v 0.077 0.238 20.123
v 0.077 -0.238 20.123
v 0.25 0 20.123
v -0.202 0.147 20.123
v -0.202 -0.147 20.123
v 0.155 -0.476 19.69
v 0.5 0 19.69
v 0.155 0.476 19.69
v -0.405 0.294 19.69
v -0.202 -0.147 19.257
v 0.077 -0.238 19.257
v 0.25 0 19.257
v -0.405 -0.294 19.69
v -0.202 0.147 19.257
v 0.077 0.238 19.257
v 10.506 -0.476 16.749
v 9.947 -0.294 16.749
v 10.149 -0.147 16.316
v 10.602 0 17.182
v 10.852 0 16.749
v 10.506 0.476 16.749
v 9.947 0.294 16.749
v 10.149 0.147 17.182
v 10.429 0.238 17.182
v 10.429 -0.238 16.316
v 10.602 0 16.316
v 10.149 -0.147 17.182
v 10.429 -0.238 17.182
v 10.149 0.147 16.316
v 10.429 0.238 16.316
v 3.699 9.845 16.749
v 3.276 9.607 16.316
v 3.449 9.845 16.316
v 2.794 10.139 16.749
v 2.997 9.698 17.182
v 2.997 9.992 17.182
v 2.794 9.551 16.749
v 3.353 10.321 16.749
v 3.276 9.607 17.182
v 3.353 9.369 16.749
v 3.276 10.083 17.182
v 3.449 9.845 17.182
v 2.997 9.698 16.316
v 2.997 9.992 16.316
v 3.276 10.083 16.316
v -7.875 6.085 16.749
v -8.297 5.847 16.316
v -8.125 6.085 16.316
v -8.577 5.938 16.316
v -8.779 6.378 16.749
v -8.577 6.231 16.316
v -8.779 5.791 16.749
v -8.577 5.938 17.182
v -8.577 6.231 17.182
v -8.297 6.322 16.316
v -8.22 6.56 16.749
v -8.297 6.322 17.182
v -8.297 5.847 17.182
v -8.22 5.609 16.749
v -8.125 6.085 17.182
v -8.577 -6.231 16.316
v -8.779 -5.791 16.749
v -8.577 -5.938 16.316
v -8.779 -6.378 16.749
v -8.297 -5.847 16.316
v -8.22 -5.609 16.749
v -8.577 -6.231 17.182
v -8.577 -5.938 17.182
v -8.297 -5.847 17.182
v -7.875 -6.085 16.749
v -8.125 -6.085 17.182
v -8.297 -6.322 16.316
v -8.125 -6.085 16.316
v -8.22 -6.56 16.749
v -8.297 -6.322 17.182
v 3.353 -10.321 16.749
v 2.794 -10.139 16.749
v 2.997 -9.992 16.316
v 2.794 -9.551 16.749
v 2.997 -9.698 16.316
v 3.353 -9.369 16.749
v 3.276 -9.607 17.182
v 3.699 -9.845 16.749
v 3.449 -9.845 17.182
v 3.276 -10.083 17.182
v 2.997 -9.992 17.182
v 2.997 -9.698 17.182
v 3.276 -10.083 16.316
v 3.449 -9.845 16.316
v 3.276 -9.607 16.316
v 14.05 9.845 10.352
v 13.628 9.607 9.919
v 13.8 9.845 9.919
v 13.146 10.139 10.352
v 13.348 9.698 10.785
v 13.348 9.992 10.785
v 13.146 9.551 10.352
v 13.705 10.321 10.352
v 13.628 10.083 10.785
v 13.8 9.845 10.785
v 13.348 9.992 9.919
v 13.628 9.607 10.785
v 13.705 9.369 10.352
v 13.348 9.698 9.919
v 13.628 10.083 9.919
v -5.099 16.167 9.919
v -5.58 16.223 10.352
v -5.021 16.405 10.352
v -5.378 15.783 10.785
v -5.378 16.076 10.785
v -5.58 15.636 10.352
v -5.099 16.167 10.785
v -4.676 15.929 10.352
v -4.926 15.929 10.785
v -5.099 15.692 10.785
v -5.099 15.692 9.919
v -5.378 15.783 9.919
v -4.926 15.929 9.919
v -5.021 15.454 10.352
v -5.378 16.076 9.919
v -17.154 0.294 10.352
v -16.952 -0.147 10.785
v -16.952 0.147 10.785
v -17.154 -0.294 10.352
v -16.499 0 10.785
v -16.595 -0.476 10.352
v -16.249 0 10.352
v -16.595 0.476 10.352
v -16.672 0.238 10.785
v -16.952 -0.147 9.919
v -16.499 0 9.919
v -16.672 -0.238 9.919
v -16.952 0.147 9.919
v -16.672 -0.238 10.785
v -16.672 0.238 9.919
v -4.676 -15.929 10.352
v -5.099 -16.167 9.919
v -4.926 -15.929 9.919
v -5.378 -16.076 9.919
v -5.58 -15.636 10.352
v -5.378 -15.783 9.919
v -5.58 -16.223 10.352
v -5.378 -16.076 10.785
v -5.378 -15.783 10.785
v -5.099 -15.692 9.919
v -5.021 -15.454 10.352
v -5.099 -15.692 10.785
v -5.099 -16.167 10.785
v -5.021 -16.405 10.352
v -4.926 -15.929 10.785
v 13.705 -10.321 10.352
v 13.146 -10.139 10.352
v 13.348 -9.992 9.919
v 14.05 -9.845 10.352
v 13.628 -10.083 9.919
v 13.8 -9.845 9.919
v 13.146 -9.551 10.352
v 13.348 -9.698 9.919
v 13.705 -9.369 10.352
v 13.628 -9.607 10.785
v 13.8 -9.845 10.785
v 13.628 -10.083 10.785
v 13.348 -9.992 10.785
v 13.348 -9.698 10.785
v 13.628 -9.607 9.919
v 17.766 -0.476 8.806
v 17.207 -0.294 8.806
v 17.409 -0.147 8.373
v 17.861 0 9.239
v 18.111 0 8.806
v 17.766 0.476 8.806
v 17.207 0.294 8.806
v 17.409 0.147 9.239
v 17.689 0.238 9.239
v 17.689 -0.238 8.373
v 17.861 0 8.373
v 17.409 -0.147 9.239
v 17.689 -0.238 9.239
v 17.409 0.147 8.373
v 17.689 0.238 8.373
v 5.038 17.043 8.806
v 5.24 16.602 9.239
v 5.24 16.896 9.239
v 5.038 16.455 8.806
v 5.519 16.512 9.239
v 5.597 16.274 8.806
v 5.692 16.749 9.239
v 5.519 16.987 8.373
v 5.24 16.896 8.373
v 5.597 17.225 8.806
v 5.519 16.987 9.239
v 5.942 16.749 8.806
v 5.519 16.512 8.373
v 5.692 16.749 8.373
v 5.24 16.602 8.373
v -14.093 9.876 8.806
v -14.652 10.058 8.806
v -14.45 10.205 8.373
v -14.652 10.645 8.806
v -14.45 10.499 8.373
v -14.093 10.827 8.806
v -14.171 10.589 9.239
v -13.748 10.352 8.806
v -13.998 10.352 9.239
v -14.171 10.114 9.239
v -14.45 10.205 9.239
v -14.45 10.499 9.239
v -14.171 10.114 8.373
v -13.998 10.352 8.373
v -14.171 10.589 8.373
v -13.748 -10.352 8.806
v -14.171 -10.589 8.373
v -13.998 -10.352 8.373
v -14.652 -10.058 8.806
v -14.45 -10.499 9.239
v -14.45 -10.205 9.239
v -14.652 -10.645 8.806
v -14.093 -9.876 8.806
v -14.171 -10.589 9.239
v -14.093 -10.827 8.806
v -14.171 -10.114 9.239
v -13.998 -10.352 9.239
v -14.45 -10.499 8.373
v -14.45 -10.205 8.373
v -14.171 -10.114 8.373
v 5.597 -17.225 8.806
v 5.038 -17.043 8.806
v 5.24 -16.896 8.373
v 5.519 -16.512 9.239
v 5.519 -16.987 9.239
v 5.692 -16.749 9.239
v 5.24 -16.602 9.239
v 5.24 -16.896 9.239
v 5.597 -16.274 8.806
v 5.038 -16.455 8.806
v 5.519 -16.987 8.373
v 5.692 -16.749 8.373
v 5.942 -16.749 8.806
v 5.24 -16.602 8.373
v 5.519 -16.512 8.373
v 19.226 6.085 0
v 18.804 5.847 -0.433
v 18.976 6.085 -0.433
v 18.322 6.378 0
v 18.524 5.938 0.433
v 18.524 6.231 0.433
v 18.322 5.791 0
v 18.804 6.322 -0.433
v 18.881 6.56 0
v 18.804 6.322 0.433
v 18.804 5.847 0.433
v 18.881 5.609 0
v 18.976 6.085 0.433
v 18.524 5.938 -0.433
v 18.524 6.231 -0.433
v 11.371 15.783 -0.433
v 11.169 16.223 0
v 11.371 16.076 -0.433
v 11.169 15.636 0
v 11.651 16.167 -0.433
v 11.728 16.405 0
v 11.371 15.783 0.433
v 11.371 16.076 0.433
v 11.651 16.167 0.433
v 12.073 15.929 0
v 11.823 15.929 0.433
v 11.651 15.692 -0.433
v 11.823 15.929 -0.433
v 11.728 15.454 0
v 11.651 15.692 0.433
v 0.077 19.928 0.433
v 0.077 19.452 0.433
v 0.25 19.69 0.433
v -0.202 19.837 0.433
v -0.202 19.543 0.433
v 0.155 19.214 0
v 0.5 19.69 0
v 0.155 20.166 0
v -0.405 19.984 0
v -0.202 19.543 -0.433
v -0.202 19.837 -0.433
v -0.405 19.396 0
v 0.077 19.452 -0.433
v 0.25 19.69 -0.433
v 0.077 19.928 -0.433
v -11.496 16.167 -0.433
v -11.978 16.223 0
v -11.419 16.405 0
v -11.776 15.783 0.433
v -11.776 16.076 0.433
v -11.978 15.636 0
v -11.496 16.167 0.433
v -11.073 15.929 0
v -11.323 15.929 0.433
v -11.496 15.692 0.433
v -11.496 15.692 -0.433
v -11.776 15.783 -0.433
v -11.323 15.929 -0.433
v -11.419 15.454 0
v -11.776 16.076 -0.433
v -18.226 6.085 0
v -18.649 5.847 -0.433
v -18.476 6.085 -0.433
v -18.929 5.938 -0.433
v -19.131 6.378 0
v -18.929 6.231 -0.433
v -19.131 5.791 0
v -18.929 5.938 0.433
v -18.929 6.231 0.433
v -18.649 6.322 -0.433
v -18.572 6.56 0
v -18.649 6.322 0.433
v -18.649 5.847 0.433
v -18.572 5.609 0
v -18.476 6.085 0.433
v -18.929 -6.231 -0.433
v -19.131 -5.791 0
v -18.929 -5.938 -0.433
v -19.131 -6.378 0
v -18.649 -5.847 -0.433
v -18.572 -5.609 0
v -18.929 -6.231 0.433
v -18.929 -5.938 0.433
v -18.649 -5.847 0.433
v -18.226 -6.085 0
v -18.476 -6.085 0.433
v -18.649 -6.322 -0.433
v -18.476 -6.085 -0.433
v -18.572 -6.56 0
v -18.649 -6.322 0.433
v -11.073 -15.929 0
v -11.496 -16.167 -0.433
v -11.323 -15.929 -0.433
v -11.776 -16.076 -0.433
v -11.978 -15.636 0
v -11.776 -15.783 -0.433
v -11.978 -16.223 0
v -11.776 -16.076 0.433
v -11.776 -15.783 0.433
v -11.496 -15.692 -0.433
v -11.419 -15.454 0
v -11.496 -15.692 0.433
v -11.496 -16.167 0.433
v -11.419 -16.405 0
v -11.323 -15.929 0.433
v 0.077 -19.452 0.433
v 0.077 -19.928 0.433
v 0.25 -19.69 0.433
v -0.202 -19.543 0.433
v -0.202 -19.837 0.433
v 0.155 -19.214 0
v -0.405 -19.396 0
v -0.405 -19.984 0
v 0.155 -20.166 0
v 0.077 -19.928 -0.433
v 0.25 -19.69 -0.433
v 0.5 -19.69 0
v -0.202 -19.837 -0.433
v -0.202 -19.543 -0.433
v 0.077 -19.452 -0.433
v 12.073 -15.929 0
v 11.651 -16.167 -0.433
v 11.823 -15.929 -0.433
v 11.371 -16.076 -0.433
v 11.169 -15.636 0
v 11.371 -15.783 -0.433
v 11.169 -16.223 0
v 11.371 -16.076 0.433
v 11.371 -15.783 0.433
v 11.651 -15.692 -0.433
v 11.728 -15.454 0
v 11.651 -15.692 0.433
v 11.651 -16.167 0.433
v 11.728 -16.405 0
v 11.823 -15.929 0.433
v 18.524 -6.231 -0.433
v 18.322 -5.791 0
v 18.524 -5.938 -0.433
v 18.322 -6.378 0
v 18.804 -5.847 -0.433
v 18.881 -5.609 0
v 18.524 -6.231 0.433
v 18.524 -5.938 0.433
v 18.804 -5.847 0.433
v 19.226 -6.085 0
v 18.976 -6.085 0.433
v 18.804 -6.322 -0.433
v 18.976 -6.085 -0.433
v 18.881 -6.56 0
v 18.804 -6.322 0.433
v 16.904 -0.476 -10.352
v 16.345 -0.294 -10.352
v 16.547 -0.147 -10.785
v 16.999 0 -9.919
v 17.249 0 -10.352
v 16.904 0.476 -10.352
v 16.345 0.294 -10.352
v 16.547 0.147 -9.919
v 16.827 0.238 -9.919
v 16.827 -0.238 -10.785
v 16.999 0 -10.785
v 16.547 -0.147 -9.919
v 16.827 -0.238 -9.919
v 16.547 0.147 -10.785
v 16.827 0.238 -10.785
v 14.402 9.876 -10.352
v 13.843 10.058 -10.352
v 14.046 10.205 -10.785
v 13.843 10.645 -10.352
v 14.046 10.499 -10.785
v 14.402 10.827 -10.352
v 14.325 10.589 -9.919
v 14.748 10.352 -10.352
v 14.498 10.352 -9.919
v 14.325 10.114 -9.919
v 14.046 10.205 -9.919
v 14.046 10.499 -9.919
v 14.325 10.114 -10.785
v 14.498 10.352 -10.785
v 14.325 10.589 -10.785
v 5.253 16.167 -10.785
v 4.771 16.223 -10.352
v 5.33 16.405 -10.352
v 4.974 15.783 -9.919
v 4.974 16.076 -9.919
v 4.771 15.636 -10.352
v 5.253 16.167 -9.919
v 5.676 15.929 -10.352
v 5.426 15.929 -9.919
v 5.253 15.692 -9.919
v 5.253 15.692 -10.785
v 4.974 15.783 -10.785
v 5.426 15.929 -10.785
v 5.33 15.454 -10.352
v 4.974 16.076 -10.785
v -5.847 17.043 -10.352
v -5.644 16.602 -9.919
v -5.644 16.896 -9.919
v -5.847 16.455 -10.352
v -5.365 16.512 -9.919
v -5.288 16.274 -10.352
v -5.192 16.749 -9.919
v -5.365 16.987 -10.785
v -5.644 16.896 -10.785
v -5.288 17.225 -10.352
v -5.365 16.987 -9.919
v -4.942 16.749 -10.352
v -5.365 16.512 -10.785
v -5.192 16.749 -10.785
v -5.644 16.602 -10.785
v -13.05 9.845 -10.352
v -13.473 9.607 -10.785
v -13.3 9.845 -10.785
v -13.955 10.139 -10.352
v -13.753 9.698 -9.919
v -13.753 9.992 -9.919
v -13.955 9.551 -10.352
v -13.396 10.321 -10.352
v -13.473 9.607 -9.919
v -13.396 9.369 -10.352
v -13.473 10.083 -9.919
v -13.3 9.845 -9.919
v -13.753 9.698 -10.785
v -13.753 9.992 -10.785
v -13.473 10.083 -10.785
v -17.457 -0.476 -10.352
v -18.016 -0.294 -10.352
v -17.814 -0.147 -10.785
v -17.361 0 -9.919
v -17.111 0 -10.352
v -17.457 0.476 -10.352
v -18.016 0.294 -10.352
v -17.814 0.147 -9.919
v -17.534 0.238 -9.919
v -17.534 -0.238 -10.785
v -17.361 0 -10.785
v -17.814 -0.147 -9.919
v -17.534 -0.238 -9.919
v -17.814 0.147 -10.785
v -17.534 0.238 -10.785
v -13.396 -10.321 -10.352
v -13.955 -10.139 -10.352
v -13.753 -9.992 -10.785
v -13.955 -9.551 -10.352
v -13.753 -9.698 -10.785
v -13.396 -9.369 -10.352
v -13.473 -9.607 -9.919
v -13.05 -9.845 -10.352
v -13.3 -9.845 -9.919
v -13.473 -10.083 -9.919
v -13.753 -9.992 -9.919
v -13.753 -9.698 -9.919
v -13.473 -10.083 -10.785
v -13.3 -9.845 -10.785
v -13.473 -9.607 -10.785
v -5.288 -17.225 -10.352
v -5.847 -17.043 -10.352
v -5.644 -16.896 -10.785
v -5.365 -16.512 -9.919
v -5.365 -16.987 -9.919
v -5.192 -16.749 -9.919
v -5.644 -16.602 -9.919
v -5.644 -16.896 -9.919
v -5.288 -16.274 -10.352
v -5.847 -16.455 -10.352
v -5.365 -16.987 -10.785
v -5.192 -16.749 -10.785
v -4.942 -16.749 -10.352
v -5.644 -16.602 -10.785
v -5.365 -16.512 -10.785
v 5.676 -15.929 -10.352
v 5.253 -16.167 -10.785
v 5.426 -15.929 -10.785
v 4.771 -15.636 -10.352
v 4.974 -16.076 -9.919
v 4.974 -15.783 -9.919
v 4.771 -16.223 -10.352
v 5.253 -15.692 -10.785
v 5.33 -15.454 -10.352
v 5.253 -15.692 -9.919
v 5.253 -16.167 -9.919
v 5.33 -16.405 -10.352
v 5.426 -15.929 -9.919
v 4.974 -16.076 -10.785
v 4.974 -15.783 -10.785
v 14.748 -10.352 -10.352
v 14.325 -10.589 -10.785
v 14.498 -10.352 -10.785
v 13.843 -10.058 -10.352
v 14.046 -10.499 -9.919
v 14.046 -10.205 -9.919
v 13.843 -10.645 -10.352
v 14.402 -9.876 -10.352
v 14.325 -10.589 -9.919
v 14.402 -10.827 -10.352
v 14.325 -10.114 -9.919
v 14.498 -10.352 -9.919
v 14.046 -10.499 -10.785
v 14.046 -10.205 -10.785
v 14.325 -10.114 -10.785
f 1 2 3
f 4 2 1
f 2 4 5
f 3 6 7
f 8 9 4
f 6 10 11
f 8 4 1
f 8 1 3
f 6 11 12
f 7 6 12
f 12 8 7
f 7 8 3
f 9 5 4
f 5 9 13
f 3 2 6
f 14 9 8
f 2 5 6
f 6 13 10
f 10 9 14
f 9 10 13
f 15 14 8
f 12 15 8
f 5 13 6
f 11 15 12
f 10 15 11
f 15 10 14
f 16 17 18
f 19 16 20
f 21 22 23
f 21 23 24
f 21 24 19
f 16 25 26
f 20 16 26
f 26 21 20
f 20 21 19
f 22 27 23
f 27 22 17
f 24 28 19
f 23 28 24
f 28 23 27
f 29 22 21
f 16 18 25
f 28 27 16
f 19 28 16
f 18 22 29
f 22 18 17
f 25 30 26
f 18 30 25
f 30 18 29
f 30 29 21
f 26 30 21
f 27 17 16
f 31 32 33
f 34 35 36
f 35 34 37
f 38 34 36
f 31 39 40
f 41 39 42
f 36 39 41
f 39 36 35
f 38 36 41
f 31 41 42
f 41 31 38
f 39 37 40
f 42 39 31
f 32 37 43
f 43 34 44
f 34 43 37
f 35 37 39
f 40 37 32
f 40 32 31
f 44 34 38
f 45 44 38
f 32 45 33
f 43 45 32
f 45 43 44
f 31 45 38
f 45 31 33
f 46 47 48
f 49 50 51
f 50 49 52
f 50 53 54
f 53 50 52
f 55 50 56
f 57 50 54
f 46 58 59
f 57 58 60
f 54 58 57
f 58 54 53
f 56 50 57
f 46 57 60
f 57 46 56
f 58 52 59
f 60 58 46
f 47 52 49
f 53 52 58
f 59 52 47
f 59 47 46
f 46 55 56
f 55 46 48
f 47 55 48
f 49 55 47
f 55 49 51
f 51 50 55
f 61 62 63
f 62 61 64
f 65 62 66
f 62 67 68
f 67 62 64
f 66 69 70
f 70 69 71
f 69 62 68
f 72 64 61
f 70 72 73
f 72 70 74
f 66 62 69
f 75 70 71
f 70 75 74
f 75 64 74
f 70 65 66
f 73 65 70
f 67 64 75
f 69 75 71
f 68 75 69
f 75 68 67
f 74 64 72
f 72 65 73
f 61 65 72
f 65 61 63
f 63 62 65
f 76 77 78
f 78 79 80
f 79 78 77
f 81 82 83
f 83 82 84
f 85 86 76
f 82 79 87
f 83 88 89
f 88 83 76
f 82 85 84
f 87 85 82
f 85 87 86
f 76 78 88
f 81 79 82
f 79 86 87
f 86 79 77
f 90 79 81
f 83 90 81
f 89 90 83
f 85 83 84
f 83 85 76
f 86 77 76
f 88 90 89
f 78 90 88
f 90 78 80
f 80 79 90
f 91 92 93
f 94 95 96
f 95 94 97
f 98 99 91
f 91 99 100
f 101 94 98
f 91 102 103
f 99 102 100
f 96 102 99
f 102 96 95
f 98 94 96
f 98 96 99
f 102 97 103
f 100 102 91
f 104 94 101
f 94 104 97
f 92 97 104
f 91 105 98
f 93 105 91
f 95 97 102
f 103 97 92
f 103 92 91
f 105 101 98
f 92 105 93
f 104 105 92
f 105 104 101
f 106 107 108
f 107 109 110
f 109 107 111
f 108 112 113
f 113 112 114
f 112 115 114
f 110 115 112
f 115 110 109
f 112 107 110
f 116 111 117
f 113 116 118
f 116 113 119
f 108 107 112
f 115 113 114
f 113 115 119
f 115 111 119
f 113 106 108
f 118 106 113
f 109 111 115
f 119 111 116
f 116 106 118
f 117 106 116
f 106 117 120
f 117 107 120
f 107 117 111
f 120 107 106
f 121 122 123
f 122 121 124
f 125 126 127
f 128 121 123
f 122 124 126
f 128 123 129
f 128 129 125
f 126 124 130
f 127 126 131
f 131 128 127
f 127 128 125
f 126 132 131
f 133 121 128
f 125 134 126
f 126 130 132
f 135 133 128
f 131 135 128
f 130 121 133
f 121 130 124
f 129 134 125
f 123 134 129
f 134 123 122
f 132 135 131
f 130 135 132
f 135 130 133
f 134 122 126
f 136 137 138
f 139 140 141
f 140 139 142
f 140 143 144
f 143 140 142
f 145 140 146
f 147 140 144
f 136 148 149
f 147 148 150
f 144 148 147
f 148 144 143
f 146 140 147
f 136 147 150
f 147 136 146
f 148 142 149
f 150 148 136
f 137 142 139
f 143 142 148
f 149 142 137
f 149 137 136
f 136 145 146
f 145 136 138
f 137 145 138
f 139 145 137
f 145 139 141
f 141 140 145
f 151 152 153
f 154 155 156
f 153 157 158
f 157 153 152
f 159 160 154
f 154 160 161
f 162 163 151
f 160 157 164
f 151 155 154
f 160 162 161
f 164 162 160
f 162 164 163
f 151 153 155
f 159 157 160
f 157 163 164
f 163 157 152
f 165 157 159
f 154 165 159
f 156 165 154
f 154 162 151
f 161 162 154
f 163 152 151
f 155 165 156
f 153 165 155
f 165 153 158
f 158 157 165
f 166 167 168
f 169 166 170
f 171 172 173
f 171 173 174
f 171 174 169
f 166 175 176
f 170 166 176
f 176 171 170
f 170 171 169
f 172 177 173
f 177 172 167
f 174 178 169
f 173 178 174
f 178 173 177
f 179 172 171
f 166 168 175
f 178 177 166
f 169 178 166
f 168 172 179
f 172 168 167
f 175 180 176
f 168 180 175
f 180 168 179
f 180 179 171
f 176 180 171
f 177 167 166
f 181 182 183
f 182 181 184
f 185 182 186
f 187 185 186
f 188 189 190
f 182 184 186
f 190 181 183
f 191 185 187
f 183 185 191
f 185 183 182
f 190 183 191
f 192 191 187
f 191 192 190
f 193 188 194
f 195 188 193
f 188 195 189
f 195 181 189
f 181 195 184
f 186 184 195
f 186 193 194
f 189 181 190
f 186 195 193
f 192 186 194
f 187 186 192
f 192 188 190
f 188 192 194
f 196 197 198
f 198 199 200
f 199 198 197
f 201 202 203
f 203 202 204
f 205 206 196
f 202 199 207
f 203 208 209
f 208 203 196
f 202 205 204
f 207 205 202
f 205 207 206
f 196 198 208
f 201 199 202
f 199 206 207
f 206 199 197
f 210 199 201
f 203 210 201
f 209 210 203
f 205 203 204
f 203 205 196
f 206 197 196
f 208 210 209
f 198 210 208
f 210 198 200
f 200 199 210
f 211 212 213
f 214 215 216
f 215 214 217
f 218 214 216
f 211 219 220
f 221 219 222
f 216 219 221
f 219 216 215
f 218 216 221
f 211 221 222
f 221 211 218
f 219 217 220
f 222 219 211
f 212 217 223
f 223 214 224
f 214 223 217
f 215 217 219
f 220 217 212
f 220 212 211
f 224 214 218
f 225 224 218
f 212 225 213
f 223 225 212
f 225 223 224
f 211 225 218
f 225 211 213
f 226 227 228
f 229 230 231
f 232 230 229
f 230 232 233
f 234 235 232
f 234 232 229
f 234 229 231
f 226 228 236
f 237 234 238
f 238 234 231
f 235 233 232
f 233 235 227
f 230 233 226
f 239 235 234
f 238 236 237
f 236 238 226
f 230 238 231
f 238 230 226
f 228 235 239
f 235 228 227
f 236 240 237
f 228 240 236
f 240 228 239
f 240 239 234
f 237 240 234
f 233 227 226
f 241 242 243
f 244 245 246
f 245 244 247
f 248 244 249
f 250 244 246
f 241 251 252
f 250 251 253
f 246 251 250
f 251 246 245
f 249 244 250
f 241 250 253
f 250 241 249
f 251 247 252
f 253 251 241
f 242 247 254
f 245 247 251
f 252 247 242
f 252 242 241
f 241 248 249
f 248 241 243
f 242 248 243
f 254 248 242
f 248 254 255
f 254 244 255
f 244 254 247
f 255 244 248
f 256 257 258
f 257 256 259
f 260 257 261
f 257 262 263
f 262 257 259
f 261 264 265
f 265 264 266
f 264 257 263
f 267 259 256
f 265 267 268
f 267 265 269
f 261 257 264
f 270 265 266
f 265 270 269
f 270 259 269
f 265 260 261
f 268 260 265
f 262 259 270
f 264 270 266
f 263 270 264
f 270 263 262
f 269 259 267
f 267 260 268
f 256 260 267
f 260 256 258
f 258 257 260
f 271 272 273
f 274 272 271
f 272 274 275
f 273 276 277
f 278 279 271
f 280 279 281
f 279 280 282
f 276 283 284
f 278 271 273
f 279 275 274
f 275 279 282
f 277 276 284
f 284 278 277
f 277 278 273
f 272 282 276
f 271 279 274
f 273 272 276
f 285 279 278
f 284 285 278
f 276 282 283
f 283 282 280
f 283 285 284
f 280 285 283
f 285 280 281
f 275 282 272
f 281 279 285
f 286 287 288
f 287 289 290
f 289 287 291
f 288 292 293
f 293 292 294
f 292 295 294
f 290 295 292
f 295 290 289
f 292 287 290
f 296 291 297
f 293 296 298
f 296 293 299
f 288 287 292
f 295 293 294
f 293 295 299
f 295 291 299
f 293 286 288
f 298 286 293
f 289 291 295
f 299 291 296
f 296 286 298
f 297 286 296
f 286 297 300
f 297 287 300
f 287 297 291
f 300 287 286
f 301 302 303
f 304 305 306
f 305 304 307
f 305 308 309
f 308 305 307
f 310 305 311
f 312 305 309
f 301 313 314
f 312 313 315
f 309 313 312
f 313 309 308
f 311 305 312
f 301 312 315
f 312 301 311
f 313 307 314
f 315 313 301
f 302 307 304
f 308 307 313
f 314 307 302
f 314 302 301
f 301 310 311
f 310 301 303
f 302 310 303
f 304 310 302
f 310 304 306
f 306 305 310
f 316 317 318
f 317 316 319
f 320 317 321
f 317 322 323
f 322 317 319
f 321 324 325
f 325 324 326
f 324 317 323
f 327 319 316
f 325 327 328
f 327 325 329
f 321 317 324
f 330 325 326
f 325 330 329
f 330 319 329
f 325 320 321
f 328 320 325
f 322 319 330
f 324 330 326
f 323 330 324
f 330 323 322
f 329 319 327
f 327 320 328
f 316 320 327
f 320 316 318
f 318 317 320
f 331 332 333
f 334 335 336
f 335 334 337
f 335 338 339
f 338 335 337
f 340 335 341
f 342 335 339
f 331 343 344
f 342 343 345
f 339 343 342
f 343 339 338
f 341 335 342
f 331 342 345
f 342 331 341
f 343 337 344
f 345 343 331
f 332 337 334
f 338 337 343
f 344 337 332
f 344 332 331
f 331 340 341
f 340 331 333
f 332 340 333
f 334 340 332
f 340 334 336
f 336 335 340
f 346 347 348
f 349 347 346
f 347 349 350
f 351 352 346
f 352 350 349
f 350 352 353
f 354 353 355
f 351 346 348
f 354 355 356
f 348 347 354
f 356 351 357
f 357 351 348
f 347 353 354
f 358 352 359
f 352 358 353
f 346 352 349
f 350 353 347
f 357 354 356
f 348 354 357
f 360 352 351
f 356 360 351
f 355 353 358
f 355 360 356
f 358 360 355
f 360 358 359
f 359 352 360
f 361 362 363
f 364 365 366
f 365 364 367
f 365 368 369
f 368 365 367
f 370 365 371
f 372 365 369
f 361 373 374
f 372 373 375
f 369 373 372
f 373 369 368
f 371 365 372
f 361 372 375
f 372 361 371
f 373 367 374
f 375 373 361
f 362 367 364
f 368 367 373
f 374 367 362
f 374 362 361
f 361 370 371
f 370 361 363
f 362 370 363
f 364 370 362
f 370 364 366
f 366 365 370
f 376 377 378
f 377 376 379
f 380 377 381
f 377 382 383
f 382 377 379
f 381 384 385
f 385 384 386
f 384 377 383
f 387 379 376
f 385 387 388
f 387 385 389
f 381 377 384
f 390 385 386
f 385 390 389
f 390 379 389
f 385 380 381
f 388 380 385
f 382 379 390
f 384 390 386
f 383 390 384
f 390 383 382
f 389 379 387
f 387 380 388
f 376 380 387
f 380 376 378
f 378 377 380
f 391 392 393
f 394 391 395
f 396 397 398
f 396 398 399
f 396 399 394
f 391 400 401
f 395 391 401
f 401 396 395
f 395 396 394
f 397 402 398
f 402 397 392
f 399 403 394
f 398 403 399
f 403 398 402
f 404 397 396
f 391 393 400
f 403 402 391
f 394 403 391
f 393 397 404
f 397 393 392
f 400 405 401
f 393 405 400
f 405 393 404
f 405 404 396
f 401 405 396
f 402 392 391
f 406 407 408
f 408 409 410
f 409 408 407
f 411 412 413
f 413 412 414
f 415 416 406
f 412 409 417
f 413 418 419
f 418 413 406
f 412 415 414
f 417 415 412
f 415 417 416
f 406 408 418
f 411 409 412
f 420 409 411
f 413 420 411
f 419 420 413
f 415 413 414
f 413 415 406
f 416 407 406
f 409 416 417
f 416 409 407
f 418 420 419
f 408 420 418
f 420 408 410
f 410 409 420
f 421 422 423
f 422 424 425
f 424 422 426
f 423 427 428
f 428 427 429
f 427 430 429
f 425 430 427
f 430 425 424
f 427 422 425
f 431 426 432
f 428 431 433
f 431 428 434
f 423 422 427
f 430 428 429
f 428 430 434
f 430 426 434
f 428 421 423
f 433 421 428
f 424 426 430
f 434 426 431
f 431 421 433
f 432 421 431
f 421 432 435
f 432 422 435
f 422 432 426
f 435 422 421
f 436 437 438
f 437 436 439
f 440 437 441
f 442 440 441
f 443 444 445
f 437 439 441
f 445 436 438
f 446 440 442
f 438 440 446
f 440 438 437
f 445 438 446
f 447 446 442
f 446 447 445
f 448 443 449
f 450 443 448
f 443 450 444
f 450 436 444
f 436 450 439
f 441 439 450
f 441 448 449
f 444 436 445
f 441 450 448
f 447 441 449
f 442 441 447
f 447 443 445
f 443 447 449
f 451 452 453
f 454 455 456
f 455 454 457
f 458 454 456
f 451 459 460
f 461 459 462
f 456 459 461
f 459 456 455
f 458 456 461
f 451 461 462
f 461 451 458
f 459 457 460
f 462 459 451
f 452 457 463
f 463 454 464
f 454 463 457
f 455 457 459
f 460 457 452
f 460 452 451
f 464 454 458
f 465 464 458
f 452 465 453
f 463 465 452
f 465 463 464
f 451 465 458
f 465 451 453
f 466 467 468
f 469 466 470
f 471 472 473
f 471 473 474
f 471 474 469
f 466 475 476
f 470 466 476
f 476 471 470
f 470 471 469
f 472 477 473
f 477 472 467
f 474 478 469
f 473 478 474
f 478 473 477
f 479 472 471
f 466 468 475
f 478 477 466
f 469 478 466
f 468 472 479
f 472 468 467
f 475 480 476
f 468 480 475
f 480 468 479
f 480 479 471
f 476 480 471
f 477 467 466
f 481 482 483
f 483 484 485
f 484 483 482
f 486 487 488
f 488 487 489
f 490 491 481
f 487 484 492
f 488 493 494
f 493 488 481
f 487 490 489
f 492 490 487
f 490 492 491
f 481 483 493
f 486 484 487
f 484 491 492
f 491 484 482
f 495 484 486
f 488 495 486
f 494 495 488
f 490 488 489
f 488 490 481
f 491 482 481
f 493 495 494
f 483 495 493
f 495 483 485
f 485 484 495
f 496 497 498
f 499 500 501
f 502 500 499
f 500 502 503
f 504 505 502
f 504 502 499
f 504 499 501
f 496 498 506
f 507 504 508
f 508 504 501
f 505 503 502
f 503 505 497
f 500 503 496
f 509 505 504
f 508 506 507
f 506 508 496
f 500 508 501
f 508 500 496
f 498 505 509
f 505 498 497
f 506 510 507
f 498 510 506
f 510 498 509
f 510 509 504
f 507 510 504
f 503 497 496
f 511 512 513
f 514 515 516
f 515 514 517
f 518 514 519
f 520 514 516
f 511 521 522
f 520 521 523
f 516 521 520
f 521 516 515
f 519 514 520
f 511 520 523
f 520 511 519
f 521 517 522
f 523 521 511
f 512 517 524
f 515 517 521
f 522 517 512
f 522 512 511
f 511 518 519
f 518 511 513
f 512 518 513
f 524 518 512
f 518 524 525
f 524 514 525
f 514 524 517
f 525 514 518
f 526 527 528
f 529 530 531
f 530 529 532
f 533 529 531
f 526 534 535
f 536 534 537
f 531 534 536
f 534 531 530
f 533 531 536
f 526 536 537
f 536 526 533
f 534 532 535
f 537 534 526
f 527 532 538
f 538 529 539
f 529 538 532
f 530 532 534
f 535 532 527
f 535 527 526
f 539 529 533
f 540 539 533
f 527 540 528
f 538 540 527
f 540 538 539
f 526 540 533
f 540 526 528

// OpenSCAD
// R50cm geodesic dome 
// 04/19/2016
// 04/21/2016

default_radius = 0.5;

// vertex(default_radius, 0, 0, 19.69); 

V = 
[
    // 1st row  
    [0, 0, 19.69],                  // 0
    
    // 2nd row
    // [10.3516, 0, -10.3517],      // 2 bug 
    [10.3516, 0, 16.7493],          // 2 correct     
    [3.19883,9.845,16.7493],        // 12 
    [-8.37466,6.08454,16.7493],     // 9        
    [-8.37466,-6.08454,16.7493],    // 6
    [3.19883,-9.845,16.7493],       // 1
 
        
    // 3rd row        
    [ 13.5505,9.845,10.3517 ],      // 15
    [ -5.17583,15.9295,10.3517 ],   // 14
    [-16.7493,0,10.3517],           // 11
    [-5.17583,-15.9295,10.3517],    // 8
    [13.5505,-9.845,10.3517],       // 4

    
    // 4th row    
    [17.6113, 0, 8.80564],          // 5
    [ 5.44218,16.7493,8.80564 ],    // 13
    [-14.2478,10.3516,8.80564],     // 10
    [-14.2478,-10.3516,8.80564],    // 7   
    [5.44218,-16.7493,8.80564],     // 3

    
    // 5th row
    [ 18.7263,6.08454,0],           // 34
    [ 11.5735,15.9295,0],           // 31
    [  0,19.69,0 ],                 // 30
    [ -11.5735,15.9295,0 ],         // 27
    [ -18.7263,6.08454,0 ],         // 26
    [ -18.7263,-6.08454,0 ],        // 23    
    [ -11.5735,-15.9295,0 ],        // 22
    [ 0,-19.69,0 ],                 // 19
    [ 11.5735,-15.9295,0 ],         // 17    
    [ 18.7263,-6.08454,0 ],         // 16   
    
    
    // 6th row      
    [ 16.7493, 0, -10.3517],          // 35
    [ 14.2478, 10.3516, -10.3517],    // 32
    [ 5.17583, 15.9295, -10.3517 ],   // 33
    [ -5.44218, 16.7493, -10.3517],   // 28
    [ -13.5505, 9.845, -10.3517 ],    // 29   
    [ -17.6113, 0, -10.3517 ],        // 24  
    [ -13.5505,- 9.845, -10.3517],    // 25
    [ -5.44218, -16.7493, -10.3517 ], // 20
    [ 5.17583, -15.9295, -10.3517 ],  // 21    
    [ 14.2478, -10.3516, -10.3517 ],  // 18 
];

// p = [x, y, z] 
module vertex(radius, p, c1="red")
{
    translate(p) color(c1) sphere(radius, center=true);    
}

module triangle(p1, f1=[[0,1,2]])
{
    polyhedron(points=p1, faces=f1);
}

module draw_vertex(fromto, c1="gray")
{
    echo("=====================");
    for (i = fromto)
    {
        vertex(default_radius, V[i], c1);
        echo(V[i]);
    } 
}

/*
for (t_v = V)
{
    vertex(default_radius, t_v, "Gray"); 
    index = search(t_v, V);
    echo(index[0], t_v);
}*/

draw_vertex([0:5], "red");
p0 = V[0];
p1 = V[1];
p2 = V[2];
p3 = V[3];
p4 = V[4];
p5 = V[5];
polyhedron(
    points=[ p1, p2, p3, p4, p5, // 5 points at base
             p0],
    faces=[ [0, 1, 5], [1, 2, 5], [2, 3, 5], [3, 4, 5],
            [4, 0, 5] ]
);

draw_vertex([6:10], "maroon");
p6 = V[6];
p7 = V[7];
p8 = V[8];
p9 = V[9];
p10 = V[10];
triangle([p1, p2, p6]);
triangle([p2, p3, p7]);
triangle([p3, p4, p8]);
triangle([p4, p5, p9]);
triangle([p5, p1, p10]);

draw_vertex([11:15], "purple");
p11 = V[11];
p12 = V[12];
p13 = V[13];
p14 = V[14];
p15 = V[15];
triangle([p1, p6, p11]);
triangle([p2, p6, p12]);
triangle([p2, p7, p12]);
triangle([p3, p7, p13]);
triangle([p3, p8, p13]);
triangle([p4, p8, p14]);
triangle([p4, p9, p14]);
triangle([p5, p9, p15]);
triangle([p5, p10, p15]);
triangle([p1, p10, p11]);

draw_vertex([16:25], "navy");
p16 = V[16];
p17 = V[17];
p18 = V[18];
p19 = V[19];
p20 = V[20];
p21 = V[21];
p22 = V[22];
p23 = V[23];
p24 = V[24];
p25 = V[25];

triangle([p6, p11, p16]);   // 6, +5, +10
triangle([p6, p12, p17]);   // 6, +6, +11  
triangle([p6, p16, p17]);   // 6, +10, +11

triangle([p7, p12, p18]);   // 7, +5, +11
triangle([p7, p13, p19]);   // 7, +6, +12
triangle([p7, p18, p19]);   // 7, +11, +12 
triangle([p12, p17, p18]);

triangle([p8, p13, p20]);
triangle([p8, p14, p21]);
triangle([p8, p20, p21]);
triangle([p13, p19, p20]);

triangle([p9, p14, p22]);
triangle([p9, p15, p23]);
triangle([p9, p22, p23]);
triangle([p14, p21, p22]);

triangle([p15, p23, p24]);
triangle([p10, p15, p24]);
triangle([p10, p24, p25]);
triangle([p10, p11, p25]);

triangle([p11, p16, p25]);

draw_vertex([26:35], "green");
p26 = V[26];
p27 = V[27];
p28 = V[28];
p29 = V[29];
p30 = V[30];
p31 = V[31];
p32 = V[32];
p33 = V[33];
p34 = V[34];
p35 = V[35];
p36 = V[36];
triangle([p16, p26, p27]);
triangle([p16, p17, p27]);
triangle([p17, p27, p28]);
triangle([p17, p18, p28]);
triangle([p18, p28, p29]);
triangle([p18, p19, p29]);
triangle([p19, p29, p30]);
triangle([p19, p20, p30]);
triangle([p20, p30, p31]);
triangle([p20, p21, p31]);
triangle([p21, p31, p32]);
triangle([p21, p22, p32]);
triangle([p22, p32, p33]);
triangle([p22, p23, p33]);
triangle([p23, p33, p34]);
triangle([p23, p24, p34]);
triangle([p24, p34, p35]);
triangle([p24, p25, p35]);
triangle([p25, p35, p26]);
color("lime") triangle([p16, p25, p26]);


// triangle([p6, p12, p17]);
// triangle([p6, p16, p17]);
